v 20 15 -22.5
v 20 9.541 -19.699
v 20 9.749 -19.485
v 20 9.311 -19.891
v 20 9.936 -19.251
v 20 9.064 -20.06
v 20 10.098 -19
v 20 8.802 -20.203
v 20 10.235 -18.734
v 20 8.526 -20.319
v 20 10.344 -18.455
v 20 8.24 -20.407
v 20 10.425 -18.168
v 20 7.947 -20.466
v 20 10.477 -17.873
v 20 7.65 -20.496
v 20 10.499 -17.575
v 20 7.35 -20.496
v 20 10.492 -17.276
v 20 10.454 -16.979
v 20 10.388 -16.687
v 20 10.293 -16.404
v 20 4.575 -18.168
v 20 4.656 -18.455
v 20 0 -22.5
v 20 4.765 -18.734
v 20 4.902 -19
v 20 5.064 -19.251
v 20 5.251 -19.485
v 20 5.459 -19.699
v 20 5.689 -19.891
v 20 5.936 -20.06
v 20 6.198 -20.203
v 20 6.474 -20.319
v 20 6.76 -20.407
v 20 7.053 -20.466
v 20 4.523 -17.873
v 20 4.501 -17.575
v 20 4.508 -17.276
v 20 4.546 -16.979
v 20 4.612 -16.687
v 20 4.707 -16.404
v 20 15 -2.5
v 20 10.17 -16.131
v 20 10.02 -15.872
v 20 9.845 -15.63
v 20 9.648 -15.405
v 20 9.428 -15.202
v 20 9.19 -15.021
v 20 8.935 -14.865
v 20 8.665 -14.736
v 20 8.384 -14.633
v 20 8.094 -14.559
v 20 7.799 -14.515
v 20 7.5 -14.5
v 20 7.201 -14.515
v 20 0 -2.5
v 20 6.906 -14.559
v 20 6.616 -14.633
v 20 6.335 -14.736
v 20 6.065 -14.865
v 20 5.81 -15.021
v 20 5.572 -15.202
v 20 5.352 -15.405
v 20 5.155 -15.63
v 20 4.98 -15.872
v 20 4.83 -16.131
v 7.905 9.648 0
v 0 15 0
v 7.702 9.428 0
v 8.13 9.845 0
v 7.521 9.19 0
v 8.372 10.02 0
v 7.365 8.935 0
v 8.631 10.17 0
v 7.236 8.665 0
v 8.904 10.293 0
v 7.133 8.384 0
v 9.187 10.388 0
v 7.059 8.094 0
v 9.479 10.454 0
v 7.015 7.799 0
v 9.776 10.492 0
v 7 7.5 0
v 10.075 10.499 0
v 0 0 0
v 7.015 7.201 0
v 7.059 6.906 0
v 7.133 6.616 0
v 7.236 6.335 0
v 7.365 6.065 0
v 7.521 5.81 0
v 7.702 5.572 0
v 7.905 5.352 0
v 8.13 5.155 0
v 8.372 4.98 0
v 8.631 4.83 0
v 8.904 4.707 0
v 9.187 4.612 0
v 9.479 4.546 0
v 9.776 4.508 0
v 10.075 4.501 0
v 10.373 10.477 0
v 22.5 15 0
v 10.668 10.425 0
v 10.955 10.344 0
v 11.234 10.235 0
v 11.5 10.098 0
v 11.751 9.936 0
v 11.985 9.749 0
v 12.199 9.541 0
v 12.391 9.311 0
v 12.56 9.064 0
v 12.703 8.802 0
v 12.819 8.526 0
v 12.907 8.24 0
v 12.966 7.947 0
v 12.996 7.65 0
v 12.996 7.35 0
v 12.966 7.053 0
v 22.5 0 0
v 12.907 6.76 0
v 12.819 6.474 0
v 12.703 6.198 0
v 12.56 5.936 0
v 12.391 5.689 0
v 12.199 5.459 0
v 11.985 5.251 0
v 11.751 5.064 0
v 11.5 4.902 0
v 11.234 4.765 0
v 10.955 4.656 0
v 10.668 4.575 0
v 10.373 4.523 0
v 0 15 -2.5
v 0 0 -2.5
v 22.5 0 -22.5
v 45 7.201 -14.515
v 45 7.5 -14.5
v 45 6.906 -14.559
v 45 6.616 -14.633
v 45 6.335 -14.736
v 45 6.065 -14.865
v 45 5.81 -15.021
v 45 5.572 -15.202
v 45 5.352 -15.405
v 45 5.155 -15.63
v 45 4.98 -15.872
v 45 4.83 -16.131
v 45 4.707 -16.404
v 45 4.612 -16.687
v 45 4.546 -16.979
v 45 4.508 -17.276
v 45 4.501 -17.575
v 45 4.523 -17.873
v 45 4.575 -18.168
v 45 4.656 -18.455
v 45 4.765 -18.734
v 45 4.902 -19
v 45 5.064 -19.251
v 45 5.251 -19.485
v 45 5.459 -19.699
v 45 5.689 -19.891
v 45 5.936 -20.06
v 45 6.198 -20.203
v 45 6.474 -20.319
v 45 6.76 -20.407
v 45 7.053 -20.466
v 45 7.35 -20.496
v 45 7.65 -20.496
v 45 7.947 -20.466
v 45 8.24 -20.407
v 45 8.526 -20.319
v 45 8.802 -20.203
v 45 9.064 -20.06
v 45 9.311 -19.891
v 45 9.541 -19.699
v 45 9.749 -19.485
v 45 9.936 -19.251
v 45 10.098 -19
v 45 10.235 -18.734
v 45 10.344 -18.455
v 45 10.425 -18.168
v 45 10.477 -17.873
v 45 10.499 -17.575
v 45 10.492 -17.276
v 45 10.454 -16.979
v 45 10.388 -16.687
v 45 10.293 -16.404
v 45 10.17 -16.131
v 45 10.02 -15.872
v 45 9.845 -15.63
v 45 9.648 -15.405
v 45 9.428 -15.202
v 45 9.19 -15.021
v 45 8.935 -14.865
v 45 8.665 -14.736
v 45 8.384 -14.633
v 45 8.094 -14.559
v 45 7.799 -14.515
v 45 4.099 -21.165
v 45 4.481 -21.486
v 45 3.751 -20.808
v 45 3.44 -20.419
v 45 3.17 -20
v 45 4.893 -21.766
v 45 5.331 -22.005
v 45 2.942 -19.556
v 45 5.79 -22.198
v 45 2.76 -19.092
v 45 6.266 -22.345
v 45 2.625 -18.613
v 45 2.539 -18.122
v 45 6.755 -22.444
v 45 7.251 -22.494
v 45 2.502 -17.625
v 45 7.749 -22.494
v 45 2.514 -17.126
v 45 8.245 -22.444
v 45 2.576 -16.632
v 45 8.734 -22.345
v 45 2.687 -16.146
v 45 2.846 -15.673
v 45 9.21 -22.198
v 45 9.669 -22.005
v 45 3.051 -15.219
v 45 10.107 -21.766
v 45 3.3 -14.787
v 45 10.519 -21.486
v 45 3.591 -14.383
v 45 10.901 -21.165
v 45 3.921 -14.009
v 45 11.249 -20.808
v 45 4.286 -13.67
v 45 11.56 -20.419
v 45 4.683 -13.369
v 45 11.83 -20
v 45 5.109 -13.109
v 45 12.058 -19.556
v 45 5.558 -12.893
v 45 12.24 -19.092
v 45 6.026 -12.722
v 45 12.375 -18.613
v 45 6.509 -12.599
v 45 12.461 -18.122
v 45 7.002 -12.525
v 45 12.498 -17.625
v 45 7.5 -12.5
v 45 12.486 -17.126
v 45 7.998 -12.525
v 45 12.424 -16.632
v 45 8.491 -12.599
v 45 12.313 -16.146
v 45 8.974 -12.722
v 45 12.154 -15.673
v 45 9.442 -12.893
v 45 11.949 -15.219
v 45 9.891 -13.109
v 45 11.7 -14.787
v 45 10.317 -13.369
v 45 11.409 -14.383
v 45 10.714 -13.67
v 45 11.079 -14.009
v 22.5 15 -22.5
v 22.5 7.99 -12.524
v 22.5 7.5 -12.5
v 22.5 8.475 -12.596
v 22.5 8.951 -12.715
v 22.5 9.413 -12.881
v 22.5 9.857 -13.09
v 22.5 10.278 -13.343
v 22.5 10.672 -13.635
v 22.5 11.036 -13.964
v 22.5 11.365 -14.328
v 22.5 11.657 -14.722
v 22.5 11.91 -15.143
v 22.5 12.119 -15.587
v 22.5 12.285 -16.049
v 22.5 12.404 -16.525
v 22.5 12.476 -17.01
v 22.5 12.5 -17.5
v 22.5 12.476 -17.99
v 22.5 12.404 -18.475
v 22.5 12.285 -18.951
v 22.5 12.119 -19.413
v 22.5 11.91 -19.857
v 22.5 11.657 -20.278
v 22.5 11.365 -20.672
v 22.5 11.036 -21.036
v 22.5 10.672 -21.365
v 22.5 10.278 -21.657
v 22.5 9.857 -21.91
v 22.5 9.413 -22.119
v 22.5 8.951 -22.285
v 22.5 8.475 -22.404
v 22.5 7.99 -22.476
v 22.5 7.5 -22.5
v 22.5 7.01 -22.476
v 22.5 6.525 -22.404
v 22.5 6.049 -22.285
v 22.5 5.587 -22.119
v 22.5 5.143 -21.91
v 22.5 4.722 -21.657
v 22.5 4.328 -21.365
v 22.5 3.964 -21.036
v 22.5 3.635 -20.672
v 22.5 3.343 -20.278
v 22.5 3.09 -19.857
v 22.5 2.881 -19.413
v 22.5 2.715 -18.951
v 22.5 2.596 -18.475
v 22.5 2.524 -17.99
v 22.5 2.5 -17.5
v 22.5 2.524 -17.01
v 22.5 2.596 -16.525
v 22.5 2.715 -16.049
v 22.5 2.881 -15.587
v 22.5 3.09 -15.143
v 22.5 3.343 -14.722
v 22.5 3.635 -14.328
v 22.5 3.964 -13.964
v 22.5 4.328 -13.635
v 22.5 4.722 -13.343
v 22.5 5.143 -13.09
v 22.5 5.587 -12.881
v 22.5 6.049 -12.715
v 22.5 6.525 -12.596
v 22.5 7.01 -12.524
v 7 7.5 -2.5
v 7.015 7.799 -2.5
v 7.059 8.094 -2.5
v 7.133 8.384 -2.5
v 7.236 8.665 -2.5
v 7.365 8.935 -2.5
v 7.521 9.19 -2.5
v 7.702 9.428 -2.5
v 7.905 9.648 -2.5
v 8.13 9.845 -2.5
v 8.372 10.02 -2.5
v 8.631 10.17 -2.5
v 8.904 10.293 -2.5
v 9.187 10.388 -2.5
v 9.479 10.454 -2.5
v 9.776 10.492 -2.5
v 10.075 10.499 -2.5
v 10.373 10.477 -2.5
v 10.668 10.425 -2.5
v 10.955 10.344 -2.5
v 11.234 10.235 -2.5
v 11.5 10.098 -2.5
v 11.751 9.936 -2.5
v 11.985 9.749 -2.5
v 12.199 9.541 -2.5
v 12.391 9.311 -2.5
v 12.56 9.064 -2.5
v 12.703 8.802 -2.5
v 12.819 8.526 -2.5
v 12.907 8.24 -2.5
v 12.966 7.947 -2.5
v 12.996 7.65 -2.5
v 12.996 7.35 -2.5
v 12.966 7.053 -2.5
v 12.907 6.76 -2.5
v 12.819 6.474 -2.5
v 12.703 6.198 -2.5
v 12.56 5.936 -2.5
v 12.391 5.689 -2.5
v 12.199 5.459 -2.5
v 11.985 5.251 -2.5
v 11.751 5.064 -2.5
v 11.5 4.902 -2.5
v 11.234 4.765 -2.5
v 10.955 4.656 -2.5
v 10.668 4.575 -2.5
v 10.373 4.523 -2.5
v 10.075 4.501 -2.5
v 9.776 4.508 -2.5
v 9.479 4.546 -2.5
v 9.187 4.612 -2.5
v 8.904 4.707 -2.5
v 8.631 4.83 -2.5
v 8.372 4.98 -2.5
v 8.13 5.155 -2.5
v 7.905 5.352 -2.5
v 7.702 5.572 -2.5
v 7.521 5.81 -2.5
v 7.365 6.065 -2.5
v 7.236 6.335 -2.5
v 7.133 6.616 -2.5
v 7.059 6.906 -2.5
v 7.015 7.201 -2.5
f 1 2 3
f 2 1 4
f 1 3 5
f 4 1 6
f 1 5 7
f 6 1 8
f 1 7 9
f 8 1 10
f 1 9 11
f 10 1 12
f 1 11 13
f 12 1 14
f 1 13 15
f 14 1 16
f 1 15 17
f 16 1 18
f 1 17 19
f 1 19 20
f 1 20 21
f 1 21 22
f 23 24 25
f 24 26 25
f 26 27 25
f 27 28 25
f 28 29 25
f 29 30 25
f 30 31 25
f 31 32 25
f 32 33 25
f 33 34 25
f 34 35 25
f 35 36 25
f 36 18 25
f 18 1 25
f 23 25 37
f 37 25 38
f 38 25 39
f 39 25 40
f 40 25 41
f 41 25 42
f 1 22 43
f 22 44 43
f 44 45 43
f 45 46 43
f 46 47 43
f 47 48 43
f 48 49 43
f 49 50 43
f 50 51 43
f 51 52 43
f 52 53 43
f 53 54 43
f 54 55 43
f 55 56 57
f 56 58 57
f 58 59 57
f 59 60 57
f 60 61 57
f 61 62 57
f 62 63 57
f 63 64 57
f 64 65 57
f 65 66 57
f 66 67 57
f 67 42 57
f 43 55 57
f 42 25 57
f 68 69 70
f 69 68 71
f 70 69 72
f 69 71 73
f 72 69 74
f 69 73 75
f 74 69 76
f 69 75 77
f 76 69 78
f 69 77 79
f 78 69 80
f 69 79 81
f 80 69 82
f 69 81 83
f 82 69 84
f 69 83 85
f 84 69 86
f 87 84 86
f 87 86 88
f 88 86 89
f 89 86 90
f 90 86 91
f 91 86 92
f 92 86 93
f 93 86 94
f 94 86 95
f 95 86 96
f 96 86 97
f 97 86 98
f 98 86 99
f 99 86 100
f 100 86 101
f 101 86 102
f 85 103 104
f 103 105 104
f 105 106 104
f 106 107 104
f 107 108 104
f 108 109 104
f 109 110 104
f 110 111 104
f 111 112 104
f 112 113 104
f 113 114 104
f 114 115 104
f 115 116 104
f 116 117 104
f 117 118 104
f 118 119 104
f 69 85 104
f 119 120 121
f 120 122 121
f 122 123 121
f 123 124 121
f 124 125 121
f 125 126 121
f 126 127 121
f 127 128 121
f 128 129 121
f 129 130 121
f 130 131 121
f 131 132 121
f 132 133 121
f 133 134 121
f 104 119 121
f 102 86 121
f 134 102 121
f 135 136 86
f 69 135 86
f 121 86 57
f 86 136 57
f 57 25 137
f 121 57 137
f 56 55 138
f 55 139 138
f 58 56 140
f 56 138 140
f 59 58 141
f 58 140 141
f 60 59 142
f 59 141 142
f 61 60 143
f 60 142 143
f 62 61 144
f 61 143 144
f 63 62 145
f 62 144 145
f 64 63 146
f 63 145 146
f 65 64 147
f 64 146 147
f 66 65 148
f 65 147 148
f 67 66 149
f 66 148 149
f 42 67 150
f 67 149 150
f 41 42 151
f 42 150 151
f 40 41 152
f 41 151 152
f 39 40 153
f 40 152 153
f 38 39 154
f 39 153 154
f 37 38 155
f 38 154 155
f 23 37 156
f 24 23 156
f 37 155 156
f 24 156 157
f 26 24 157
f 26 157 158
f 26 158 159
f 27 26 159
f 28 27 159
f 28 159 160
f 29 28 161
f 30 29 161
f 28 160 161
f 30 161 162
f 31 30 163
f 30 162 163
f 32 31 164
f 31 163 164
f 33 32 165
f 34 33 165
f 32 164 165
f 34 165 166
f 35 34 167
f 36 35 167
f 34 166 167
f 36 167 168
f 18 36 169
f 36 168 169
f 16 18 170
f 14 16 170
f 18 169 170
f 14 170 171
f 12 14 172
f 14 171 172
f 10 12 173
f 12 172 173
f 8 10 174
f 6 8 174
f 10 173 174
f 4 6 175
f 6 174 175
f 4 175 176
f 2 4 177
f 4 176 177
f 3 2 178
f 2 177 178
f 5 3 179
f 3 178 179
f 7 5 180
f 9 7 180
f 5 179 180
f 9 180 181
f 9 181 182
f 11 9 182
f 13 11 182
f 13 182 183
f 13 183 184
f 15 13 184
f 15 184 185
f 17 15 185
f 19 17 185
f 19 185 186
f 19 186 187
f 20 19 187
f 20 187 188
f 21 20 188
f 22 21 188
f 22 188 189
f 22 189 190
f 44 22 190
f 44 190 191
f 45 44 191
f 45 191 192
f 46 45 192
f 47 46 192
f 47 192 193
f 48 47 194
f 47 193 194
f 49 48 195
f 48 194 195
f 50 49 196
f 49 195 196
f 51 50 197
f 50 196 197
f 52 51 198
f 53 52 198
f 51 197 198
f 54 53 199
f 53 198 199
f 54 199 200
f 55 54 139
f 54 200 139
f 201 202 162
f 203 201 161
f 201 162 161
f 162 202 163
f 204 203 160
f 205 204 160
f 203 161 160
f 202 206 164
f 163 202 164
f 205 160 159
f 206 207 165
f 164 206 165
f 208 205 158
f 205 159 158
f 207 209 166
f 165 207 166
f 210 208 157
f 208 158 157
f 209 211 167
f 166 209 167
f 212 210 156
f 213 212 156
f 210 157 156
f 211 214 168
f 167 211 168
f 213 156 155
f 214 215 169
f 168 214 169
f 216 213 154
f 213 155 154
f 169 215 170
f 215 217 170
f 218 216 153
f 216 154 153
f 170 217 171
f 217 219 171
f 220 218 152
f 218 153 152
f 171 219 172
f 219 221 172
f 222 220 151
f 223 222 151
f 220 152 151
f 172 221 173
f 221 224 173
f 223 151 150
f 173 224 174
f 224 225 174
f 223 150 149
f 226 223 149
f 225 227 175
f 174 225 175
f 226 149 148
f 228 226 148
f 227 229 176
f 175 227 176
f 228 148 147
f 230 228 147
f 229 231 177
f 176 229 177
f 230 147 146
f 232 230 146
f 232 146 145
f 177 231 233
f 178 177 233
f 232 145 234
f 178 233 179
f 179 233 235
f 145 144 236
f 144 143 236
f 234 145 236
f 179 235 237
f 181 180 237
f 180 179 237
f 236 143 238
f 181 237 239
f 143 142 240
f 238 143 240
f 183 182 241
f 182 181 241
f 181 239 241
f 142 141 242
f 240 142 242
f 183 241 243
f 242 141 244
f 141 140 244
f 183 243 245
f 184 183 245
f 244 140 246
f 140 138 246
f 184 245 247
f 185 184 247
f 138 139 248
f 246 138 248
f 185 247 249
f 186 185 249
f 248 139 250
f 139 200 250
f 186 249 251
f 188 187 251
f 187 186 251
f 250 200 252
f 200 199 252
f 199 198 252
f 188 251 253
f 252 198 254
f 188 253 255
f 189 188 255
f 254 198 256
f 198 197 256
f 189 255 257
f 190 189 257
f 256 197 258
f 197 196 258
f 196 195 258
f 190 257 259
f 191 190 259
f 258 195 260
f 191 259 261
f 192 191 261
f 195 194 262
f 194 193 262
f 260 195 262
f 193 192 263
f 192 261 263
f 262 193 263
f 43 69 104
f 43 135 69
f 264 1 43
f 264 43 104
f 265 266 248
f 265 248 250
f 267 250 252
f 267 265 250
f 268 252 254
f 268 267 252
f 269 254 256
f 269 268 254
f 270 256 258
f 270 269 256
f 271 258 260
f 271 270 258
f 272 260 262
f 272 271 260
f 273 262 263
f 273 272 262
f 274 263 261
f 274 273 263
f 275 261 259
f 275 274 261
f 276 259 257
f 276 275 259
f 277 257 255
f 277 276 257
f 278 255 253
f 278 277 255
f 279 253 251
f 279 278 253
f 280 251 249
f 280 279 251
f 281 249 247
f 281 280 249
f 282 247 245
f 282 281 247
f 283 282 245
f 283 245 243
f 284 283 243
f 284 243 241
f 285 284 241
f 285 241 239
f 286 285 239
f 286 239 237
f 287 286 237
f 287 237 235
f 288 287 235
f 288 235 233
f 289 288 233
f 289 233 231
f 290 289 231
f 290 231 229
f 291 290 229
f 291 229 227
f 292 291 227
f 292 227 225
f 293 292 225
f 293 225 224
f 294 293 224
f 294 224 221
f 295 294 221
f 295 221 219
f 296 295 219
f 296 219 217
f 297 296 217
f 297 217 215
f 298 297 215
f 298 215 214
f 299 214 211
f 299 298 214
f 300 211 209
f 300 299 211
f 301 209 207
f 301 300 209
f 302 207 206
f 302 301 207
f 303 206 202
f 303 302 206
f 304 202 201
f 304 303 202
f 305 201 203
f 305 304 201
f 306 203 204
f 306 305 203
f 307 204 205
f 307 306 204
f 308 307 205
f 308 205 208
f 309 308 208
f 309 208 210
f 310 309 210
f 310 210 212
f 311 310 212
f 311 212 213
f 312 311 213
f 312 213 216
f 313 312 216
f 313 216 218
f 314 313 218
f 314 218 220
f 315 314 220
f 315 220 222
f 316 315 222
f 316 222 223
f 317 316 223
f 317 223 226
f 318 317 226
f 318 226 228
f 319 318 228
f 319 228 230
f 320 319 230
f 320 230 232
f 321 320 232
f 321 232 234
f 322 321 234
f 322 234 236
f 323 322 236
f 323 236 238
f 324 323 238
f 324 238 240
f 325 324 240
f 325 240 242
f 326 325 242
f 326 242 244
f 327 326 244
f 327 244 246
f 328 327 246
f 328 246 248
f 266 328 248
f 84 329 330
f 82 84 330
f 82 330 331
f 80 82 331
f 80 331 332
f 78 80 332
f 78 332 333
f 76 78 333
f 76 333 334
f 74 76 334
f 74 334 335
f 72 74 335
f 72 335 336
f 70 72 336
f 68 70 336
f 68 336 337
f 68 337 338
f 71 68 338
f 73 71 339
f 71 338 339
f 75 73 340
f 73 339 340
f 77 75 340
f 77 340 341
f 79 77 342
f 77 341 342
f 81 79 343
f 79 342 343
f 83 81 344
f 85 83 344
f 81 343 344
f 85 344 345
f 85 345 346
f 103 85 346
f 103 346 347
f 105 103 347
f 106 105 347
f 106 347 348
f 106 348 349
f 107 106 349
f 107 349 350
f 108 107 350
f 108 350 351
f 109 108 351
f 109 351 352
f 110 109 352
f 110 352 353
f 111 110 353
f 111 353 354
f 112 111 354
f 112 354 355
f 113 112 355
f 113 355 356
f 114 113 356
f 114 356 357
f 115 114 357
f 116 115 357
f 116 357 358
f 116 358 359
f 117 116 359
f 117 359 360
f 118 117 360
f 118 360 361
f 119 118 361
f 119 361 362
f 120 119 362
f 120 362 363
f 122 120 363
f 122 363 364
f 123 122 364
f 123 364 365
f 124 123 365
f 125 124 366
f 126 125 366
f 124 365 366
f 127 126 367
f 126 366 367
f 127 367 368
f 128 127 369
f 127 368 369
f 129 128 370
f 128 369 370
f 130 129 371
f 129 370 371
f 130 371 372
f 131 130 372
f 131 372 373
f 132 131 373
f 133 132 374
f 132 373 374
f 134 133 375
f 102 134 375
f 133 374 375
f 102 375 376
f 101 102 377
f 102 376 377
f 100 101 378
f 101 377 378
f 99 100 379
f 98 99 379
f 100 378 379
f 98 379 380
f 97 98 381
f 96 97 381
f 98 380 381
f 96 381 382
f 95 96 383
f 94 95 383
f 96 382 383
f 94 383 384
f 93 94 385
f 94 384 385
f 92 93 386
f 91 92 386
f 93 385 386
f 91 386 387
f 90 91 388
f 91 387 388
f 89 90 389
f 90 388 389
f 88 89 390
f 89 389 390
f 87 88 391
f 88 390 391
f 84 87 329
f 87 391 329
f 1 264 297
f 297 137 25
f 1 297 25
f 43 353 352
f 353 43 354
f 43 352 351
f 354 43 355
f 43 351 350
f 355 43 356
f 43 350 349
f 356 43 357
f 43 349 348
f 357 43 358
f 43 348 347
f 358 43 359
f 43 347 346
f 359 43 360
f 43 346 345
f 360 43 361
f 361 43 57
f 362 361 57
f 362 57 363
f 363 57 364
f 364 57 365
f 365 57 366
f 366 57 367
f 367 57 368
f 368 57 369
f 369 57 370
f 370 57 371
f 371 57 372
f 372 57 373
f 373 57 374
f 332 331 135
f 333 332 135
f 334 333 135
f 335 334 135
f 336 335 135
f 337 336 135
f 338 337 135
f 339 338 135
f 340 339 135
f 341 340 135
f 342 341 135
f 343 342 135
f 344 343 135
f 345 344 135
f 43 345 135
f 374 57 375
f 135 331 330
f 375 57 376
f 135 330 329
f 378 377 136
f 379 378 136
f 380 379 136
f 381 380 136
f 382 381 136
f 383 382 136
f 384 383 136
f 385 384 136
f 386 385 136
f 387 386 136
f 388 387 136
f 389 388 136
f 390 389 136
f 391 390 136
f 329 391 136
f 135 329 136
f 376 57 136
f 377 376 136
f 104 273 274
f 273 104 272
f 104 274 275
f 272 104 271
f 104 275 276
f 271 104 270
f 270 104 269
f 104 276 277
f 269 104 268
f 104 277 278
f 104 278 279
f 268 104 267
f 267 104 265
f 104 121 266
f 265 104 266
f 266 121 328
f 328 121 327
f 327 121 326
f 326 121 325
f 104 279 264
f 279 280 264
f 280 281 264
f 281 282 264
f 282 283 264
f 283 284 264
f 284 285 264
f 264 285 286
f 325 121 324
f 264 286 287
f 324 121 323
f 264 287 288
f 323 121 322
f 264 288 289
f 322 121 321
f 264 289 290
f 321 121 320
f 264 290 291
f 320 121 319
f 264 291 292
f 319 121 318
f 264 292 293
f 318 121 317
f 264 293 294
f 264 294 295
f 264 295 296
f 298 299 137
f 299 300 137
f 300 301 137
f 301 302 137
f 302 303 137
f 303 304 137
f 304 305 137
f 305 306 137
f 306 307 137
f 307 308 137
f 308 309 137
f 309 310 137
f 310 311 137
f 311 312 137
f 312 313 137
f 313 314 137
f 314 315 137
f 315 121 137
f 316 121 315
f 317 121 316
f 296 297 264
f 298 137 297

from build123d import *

# Parameters (mm, degrees)
BOSS_EXTRUDE2_DEPTH = 15
SKETCH4_R           = 3
CUT_EXTRUDE2_DEPTH  = 34.634060118
SKETCH7_R           = 5
SKETCH7_R_2         = 3
BOSS_EXTRUDE5_DEPTH = 25
SKETCH8_R           = 3
CUT_EXTRUDE3_DEPTH  = 36.178118199


with BuildPart() as part:
    # Sketch3 → Boss-Extrude2 (new body)
    with BuildSketch(Plane(origin=(0, 0, 0), x_dir=(1, 0, 0), z_dir=(0, 1, 0))):
        Polygon((0, 0), (22.5, 0), (22.5, 22.5), (20, 22.5), (20, 2.5), (0, 2.5), align=None)
    extrude(amount=BOSS_EXTRUDE2_DEPTH)

    # Sketch4 → Cut-Extrude2 (cut, through all)
    with BuildSketch(Plane(origin=(0, 0, -2.5), x_dir=(-1, 0, 0), z_dir=(0, 0, -1))):
        with Locations((-10, 7.5)):
            Circle(SKETCH4_R)
    extrude(amount=-CUT_EXTRUDE2_DEPTH, mode=Mode.SUBTRACT)

    # Sketch7 → Boss-Extrude5 (add)
    with BuildSketch(Plane.ZY.offset(-20)):
        with Locations((-17.5, 7.5)):
            Circle(SKETCH7_R)
        with Locations((-17.5, 7.5)):
            Circle(SKETCH7_R_2, mode=Mode.SUBTRACT)
    extrude(amount=-BOSS_EXTRUDE5_DEPTH)

    # Sketch8 → Cut-Extrude3 (cut, through all)
    with BuildSketch(Plane(origin=(22.5, 0, 0), x_dir=(0, 0, -1), z_dir=(1, 0, 0))):
        with Locations(Location((17.5, 7.5, 0), (0, 0, 180))):
            Circle(SKETCH8_R)
    extrude(amount=-CUT_EXTRUDE3_DEPTH, mode=Mode.SUBTRACT)


solid = part.part
